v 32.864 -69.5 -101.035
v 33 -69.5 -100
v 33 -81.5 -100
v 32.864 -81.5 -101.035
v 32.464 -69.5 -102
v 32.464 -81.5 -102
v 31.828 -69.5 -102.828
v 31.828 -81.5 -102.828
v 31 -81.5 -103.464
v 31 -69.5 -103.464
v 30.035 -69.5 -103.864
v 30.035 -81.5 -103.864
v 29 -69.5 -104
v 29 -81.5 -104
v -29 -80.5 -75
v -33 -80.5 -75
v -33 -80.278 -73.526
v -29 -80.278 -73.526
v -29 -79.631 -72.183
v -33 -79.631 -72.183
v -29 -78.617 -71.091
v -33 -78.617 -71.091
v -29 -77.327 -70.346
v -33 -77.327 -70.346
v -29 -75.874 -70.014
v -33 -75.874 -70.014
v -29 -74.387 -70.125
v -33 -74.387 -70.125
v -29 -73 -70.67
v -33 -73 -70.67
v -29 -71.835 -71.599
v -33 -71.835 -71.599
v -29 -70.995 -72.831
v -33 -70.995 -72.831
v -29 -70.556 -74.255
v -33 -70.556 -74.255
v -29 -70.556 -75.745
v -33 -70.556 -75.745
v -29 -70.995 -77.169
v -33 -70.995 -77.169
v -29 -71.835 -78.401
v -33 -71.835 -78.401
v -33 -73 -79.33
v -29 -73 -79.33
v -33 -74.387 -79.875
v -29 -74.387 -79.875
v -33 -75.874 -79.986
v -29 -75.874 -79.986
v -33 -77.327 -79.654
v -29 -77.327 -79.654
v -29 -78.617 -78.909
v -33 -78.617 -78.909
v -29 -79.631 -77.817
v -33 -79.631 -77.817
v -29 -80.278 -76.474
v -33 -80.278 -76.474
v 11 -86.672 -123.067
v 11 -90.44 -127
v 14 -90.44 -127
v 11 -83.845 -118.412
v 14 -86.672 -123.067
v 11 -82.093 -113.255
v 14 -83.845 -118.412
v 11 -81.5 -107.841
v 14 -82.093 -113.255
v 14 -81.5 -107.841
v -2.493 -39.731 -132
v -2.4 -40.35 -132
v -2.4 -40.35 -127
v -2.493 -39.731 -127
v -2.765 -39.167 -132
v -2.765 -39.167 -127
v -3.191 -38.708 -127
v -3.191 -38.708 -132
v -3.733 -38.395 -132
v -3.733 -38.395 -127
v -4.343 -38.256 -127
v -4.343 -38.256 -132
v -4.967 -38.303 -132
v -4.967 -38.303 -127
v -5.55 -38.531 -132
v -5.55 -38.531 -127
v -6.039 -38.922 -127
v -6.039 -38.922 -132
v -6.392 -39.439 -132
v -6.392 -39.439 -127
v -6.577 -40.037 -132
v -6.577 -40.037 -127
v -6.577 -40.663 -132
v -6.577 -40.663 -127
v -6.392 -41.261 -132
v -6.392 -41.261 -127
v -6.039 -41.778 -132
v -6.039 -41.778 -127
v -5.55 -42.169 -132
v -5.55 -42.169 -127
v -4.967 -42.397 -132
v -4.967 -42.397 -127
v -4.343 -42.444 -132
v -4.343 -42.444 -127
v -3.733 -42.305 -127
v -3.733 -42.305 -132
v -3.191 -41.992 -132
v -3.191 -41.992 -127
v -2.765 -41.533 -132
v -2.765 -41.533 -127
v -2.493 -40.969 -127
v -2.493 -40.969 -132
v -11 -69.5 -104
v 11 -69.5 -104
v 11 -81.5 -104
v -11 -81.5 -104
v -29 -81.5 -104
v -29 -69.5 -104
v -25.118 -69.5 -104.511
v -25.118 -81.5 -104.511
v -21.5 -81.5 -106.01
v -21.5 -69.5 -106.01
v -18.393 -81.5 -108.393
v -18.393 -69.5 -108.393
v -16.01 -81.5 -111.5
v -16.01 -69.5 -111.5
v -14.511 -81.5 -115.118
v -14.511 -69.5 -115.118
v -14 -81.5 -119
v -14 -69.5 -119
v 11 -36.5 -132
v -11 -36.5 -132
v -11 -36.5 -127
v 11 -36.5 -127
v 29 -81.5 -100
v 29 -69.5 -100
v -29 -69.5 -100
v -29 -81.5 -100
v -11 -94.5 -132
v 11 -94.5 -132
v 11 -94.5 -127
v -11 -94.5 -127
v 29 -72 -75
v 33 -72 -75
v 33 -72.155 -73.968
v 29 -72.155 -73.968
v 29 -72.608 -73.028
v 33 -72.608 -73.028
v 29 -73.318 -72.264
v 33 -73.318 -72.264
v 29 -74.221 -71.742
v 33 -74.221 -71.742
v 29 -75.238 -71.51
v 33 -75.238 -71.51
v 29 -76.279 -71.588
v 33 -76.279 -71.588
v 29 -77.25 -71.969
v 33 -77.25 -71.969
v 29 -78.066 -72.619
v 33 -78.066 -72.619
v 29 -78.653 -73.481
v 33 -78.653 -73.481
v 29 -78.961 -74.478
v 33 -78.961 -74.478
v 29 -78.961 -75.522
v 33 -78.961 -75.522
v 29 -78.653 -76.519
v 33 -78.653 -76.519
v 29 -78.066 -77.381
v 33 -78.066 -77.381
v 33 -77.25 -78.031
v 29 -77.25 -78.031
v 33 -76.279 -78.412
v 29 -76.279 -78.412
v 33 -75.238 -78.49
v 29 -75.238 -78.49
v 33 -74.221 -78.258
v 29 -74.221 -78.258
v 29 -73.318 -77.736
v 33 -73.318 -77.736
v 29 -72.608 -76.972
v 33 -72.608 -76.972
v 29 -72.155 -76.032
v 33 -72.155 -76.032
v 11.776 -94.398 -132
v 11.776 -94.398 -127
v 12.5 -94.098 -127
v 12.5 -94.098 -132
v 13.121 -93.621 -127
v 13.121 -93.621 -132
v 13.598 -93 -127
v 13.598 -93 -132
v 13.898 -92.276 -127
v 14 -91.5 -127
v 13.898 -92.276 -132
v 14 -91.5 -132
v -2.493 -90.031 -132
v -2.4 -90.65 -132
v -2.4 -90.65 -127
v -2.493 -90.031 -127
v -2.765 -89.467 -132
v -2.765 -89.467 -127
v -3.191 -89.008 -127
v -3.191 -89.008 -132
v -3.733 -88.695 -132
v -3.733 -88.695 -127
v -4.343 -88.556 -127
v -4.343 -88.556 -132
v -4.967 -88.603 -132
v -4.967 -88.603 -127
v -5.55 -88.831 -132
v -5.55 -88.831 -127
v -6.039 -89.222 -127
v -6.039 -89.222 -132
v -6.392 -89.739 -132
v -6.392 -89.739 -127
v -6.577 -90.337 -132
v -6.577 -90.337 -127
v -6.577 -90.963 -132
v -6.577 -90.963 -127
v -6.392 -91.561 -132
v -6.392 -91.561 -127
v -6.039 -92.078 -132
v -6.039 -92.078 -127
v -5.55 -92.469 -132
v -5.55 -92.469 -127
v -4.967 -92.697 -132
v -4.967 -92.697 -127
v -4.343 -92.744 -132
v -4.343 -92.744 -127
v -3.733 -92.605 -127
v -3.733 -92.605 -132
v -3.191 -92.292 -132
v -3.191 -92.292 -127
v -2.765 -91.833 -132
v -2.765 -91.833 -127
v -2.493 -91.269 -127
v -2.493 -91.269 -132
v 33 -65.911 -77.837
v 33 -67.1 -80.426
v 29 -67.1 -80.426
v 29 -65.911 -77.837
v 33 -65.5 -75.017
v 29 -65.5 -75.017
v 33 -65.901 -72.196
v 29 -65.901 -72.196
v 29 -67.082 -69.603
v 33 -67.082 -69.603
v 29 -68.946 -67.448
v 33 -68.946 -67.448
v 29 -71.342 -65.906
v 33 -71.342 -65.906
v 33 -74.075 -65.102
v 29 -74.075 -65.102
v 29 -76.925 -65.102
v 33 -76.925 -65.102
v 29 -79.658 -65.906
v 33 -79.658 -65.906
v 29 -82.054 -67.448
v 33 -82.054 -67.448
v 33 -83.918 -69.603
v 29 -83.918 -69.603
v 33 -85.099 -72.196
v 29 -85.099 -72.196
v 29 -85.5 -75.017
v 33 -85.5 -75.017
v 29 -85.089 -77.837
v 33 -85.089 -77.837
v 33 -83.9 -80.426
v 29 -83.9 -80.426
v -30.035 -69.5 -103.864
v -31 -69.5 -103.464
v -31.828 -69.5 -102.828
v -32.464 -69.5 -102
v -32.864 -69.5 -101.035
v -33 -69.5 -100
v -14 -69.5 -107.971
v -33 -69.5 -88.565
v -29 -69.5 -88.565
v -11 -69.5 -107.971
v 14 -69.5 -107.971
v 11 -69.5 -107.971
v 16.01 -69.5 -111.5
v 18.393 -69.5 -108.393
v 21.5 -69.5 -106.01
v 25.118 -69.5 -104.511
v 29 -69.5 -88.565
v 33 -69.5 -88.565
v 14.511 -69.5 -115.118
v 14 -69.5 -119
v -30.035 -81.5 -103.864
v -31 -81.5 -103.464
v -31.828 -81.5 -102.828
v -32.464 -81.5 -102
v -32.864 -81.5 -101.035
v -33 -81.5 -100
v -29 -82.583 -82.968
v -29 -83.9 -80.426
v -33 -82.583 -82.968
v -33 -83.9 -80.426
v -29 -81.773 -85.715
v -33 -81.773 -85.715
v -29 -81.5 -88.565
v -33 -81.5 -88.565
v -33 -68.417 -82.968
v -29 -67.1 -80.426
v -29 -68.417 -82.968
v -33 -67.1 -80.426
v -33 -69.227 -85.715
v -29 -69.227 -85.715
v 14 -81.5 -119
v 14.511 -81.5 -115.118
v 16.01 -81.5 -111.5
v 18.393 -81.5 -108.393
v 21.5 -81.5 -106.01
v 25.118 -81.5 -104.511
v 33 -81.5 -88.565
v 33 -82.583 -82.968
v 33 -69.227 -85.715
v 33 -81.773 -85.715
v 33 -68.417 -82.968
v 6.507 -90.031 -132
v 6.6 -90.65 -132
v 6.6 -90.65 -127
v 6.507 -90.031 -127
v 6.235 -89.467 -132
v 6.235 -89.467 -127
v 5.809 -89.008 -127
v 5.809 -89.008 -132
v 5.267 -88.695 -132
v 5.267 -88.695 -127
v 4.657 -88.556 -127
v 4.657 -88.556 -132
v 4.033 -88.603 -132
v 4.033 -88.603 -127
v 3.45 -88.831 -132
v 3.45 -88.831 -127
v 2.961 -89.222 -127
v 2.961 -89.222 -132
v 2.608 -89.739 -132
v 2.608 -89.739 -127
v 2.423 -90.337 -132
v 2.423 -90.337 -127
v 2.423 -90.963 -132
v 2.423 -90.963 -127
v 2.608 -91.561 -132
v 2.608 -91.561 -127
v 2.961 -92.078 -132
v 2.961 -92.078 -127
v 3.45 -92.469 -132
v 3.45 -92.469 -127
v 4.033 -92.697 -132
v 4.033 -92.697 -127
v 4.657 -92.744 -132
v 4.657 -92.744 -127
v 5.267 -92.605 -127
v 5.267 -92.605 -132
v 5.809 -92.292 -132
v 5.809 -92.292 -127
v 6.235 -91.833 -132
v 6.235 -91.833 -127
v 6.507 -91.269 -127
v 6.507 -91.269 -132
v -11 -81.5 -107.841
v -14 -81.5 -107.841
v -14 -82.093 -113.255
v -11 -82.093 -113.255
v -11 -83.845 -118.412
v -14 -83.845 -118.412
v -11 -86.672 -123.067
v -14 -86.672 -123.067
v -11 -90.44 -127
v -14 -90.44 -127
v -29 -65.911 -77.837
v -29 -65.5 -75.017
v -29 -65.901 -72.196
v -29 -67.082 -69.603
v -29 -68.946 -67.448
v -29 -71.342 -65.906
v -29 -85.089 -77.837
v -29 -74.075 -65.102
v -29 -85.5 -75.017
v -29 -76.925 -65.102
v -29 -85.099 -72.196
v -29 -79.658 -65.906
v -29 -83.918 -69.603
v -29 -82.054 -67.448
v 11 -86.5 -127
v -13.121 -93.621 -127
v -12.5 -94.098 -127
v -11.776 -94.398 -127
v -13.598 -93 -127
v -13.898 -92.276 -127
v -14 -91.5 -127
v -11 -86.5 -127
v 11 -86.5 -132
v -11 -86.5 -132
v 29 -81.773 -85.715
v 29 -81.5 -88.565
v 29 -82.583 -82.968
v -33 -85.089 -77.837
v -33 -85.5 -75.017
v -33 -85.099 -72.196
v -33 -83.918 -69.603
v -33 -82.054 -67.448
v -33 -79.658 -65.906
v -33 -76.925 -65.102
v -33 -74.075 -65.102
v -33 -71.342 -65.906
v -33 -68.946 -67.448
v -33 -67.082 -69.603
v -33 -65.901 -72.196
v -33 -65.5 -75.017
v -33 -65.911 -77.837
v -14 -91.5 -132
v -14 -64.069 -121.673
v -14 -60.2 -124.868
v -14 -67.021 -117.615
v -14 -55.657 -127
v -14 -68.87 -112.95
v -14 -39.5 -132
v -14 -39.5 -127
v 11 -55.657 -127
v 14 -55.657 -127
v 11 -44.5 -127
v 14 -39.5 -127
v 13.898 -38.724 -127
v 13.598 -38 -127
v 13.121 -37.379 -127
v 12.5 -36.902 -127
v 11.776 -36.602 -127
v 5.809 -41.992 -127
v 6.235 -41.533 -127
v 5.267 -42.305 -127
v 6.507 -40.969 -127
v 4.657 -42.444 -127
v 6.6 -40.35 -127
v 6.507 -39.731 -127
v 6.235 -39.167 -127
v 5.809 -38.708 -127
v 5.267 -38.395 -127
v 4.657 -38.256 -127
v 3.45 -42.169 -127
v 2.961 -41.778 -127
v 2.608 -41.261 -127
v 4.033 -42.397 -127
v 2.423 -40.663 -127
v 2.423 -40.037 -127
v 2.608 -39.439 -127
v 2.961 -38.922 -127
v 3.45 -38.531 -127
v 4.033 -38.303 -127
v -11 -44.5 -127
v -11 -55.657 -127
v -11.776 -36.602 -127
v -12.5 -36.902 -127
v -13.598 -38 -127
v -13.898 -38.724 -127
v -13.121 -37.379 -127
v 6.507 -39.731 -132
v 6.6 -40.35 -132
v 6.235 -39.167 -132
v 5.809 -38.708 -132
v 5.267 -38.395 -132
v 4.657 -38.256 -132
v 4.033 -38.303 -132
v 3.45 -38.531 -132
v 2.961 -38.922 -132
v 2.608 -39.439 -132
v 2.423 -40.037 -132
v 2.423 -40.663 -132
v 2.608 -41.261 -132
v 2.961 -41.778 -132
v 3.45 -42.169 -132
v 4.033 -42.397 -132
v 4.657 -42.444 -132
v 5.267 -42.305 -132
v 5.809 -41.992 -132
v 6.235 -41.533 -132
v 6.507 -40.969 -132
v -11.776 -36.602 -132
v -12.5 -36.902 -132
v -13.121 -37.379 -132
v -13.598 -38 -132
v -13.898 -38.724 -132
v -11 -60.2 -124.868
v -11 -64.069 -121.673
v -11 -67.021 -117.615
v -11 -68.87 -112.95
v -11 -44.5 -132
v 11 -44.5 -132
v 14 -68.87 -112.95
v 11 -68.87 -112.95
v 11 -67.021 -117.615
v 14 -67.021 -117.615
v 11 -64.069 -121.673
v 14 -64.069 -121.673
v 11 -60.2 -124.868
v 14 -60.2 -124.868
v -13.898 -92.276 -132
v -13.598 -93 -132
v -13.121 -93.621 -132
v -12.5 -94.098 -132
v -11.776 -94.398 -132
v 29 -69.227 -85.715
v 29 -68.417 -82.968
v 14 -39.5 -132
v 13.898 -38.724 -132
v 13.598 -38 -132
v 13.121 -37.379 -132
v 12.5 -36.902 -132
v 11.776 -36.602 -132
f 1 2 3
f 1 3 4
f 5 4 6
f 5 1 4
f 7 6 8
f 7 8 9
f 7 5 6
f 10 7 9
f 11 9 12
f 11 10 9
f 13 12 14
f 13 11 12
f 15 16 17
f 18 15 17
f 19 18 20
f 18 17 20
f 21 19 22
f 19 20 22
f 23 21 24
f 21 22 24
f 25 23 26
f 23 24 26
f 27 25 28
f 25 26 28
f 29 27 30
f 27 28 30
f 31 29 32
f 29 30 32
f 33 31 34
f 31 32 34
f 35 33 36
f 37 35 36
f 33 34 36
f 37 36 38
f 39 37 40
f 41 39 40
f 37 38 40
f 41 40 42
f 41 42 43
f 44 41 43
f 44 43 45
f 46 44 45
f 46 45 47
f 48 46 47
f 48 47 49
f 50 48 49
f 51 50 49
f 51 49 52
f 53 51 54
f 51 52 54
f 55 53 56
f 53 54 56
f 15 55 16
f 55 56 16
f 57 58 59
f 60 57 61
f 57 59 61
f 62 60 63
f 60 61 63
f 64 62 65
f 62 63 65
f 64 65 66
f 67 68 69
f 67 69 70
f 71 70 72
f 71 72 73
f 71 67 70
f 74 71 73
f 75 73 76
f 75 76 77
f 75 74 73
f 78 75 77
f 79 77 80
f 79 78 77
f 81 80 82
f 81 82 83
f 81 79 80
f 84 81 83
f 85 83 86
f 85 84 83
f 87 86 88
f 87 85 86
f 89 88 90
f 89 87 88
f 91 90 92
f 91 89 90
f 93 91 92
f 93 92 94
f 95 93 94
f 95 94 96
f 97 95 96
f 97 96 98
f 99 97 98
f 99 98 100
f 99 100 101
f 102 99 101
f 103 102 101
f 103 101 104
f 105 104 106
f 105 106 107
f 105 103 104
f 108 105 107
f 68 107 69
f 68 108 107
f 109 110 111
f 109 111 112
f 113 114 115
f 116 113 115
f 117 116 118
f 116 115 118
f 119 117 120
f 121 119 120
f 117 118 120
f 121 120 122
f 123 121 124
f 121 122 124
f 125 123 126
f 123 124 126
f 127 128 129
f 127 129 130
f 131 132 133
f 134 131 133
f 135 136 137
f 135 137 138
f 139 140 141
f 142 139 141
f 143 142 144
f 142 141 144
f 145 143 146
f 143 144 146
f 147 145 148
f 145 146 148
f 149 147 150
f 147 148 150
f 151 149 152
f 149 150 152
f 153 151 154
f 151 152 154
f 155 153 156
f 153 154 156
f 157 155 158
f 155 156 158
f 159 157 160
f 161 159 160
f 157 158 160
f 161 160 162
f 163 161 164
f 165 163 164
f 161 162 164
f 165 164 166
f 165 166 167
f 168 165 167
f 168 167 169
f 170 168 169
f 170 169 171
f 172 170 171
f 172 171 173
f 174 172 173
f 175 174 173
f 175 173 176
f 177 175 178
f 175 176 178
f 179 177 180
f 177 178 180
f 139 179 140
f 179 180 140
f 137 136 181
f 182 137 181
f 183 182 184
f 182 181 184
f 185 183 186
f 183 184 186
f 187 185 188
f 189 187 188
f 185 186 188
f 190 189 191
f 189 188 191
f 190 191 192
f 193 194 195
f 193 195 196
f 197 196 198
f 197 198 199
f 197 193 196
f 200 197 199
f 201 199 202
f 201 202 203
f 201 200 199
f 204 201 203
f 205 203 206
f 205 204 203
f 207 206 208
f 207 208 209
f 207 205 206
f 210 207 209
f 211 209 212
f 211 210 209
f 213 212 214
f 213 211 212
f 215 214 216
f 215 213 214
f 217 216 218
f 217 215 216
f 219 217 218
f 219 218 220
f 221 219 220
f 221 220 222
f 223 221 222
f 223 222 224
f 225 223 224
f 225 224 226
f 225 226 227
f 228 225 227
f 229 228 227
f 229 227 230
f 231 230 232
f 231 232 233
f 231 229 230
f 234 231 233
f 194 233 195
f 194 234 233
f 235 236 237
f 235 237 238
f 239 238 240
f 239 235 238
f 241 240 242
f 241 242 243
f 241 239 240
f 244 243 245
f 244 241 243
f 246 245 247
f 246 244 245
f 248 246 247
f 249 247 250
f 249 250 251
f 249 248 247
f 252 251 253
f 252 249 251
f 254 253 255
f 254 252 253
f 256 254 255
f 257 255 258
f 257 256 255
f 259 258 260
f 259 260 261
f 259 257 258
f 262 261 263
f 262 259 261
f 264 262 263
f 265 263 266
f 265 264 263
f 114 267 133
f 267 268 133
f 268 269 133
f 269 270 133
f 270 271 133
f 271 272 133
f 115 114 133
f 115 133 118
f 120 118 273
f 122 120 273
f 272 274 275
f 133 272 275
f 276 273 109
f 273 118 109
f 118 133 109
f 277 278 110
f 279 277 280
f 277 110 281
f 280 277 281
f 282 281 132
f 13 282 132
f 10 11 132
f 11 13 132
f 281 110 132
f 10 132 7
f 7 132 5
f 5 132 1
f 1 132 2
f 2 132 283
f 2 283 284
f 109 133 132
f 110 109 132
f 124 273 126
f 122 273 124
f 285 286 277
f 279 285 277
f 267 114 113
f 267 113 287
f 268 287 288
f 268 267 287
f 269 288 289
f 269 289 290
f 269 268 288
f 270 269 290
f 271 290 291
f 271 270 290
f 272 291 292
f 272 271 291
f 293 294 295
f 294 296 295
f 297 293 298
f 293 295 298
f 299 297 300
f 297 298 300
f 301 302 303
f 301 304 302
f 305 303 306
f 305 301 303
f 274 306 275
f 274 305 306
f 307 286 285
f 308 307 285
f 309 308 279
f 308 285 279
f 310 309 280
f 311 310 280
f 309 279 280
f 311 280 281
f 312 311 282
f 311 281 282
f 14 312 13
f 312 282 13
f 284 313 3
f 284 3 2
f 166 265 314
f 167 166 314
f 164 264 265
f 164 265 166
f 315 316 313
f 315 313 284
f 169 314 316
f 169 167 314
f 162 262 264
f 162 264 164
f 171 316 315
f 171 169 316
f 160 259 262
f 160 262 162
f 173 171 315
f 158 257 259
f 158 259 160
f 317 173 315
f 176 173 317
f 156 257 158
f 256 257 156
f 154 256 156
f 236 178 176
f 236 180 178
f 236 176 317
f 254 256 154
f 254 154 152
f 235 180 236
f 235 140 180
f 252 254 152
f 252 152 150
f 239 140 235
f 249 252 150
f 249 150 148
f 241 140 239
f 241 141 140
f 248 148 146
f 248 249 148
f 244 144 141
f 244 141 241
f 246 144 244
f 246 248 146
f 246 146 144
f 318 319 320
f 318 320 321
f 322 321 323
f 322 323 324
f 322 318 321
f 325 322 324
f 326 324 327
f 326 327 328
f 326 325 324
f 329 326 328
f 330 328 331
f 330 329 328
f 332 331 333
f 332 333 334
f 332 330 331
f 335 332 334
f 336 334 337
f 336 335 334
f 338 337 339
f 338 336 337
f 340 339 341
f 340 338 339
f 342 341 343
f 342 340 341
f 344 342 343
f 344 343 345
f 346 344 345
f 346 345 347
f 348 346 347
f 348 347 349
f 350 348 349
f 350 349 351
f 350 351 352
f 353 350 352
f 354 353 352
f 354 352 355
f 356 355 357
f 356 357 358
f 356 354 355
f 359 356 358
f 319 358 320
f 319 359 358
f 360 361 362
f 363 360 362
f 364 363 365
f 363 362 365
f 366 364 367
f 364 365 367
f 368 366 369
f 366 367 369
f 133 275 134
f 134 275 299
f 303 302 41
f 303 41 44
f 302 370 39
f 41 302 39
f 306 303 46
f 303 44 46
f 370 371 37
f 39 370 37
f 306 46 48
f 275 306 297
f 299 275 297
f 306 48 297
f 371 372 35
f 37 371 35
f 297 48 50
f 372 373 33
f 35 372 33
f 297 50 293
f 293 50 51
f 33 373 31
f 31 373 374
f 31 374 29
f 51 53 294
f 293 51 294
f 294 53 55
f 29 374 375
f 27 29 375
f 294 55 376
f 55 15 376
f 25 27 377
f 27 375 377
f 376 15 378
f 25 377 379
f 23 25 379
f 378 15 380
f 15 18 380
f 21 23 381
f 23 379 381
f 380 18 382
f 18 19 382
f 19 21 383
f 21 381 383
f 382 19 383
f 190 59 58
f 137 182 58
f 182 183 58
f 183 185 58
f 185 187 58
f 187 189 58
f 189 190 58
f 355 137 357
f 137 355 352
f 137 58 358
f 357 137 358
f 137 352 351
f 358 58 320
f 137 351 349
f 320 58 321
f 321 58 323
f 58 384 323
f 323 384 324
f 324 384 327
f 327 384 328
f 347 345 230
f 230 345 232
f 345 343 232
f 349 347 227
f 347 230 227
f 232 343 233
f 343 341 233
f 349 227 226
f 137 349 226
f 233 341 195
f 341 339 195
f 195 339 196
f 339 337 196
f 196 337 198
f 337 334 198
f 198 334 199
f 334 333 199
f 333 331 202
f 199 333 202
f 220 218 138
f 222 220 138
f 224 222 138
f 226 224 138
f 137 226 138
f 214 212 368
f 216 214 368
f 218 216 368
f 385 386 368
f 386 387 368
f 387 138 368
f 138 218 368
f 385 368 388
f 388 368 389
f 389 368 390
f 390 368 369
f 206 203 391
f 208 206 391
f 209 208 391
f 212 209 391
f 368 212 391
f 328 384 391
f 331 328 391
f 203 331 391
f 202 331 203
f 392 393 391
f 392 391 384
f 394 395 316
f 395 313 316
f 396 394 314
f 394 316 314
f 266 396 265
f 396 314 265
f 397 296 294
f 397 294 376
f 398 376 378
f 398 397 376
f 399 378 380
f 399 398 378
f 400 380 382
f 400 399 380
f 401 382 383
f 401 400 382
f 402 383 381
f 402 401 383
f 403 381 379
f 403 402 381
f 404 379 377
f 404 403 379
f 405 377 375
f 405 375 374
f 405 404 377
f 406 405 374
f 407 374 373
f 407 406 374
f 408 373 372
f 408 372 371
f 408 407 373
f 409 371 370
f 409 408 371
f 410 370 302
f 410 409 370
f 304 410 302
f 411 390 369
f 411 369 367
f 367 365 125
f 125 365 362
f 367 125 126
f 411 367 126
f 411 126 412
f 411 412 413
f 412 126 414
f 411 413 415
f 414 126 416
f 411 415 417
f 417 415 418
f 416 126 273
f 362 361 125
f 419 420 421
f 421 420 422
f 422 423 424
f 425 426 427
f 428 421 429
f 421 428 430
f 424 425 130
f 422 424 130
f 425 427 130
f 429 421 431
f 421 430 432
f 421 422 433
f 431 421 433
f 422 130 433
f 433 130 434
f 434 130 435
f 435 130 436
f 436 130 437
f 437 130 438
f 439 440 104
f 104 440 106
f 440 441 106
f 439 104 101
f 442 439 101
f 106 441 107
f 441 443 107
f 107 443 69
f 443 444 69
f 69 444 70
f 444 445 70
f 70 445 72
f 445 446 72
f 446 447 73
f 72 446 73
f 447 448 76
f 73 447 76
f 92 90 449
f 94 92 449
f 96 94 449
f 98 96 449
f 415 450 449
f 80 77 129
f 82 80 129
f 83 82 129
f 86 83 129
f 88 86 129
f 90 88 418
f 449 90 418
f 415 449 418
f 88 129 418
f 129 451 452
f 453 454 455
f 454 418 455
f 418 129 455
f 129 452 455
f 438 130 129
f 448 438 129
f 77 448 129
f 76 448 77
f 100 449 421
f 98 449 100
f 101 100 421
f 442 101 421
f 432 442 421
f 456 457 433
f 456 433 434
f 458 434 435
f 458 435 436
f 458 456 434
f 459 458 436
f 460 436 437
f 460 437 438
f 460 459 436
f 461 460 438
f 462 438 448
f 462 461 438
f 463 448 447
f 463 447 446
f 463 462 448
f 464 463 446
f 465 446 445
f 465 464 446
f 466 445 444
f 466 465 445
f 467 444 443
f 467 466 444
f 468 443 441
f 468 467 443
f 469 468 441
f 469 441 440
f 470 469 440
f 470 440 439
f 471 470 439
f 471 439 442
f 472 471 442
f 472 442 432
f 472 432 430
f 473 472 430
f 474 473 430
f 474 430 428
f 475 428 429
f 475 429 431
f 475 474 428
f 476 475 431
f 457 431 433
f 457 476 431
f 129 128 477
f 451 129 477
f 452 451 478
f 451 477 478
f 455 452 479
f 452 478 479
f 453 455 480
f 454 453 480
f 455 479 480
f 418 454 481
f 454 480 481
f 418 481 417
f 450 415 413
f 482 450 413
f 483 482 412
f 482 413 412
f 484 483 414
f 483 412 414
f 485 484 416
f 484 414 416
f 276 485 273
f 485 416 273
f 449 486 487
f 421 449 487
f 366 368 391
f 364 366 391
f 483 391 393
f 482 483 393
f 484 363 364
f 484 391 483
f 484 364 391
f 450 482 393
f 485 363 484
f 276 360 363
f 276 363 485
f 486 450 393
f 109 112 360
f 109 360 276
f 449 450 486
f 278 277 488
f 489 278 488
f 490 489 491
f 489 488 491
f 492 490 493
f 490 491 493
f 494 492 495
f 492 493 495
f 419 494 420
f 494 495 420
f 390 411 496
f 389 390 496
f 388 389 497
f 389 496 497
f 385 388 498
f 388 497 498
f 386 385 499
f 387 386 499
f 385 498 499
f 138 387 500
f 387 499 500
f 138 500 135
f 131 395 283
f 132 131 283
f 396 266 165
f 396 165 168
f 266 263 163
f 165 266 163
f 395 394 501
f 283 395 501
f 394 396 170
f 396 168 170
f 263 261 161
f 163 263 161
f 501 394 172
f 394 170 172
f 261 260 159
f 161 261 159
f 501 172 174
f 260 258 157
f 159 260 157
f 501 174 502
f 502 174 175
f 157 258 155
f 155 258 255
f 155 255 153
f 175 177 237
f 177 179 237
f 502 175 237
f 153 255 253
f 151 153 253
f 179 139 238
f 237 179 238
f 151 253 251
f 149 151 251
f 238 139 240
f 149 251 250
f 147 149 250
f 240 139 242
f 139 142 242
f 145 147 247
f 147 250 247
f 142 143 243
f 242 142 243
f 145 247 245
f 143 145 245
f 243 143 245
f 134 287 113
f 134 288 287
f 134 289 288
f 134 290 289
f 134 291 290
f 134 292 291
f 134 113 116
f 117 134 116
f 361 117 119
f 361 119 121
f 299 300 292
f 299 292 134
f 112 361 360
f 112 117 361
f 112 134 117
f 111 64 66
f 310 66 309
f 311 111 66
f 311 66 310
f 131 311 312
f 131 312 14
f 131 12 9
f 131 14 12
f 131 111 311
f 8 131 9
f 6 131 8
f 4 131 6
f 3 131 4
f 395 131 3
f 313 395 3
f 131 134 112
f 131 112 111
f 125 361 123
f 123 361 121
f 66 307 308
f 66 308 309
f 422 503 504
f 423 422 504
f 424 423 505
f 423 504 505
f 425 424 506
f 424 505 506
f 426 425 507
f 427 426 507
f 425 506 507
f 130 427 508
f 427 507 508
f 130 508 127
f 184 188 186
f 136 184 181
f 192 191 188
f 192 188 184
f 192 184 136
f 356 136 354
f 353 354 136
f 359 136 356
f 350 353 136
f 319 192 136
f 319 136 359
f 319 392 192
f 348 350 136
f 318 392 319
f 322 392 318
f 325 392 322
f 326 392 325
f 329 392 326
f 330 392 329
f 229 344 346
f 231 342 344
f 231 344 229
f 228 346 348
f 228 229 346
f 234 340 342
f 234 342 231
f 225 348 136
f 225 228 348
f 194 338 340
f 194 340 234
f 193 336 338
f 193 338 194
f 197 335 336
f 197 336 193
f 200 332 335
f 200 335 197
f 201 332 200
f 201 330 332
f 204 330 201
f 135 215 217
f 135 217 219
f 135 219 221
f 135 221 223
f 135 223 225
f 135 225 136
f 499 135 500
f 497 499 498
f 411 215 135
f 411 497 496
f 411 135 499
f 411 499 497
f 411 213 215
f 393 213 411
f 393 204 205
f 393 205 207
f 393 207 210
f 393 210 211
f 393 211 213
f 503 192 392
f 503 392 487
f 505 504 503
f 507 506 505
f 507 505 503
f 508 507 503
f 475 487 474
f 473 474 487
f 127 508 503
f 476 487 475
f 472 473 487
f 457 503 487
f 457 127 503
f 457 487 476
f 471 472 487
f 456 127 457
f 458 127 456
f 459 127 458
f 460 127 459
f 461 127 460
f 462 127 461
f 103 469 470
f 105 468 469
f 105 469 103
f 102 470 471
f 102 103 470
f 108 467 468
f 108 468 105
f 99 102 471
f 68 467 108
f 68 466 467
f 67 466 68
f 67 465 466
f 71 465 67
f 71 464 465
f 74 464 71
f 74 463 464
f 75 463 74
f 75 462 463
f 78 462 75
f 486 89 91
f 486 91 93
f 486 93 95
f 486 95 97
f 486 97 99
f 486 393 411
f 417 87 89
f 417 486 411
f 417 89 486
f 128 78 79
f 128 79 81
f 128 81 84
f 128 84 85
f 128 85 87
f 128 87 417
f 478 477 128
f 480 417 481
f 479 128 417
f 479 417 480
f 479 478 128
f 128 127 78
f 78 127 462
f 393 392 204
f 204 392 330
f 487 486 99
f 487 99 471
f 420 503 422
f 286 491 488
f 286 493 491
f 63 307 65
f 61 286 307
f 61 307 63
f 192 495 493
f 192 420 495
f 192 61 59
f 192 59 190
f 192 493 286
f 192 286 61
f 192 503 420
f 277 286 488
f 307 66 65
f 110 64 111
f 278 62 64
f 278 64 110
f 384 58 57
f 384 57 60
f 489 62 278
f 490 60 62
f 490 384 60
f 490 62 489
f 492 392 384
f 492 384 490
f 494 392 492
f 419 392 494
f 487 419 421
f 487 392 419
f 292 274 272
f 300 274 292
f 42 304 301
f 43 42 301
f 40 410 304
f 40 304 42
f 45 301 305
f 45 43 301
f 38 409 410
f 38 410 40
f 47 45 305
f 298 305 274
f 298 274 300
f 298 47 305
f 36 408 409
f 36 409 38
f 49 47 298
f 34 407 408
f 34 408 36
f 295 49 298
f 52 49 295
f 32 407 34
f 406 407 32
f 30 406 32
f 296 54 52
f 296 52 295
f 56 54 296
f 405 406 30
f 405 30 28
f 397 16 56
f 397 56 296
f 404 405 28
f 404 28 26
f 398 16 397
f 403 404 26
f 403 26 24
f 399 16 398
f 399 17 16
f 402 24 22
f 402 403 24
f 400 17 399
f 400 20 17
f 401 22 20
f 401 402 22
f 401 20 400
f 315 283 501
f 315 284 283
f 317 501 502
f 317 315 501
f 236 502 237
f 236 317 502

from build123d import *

# Parameters (mm, degrees)
SKETCH022_R             = 2.1
SKETCH022_W             = 22
SKETCH022_H             = 42
PAD010_DEPTH            = 5
PAD013_DEPTH            = 3
PAD011_DEPTH            = 3
PAD012_DEPTH            = 12
SKETCH028_R             = 10
PAD014_DEPTH            = 4
SKETCH029_R             = 3.5
POCKET011_DEPTH         = 4
SKETCH026_R             = 10
PAD015_DEPTH            = 4
SKETCH025_R             = 5
POCKET012_DEPTH         = 4
FILLET002_R             = 15
BODY005_PLACEMENT_ANGLE = 90


with BuildPart() as part:
    # Sketch022 → Pad010 (new body)
    with BuildSketch(Plane.XZ):
        with BuildLine():
            Line((-11, 29), (11, 29))
            ThreePointArc((14, 26), (13.1213203436, 28.1213203436), (11, 29))
            Line((14, 26), (14, -26))
            ThreePointArc((11, -29), (13.1213203436, -28.1213203436), (14, -26))
            Line((11, -29), (-11, -29))
            ThreePointArc((-14, -26), (-13.1213203436, -28.1213203436), (-11, -29))
            Line((-14, -26), (-14, 26))
            ThreePointArc((-11, 29), (-13.1213203436, 28.1213203436), (-14, 26))
        make_face()
        with Locations((-4.5, -25.15)):
            Circle(SKETCH022_R, mode=Mode.SUBTRACT)
        with Locations((4.5, -25.15)):
            Circle(SKETCH022_R, mode=Mode.SUBTRACT)
        with Locations((-4.5, 25.15)):
            Circle(SKETCH022_R, mode=Mode.SUBTRACT)
        with Locations((4.5, 25.15)):
            Circle(SKETCH022_R, mode=Mode.SUBTRACT)
        Rectangle(SKETCH022_W, SKETCH022_H, mode=Mode.SUBTRACT)
    extrude(amount=PAD010_DEPTH)

    # Sketch023 (on Face1 of Pad010) → Pad013 (join)
    with BuildSketch(Plane(origin=(-14, 0, 0), x_dir=(0, 0, -1), z_dir=(-1, 0, 0))):
        with BuildLine():
            Line((4, 29.0287840283), (16, 29.0287840283))
            Line((16, 29.0287840283), (16, 24.1593727123))
            ThreePointArc((16, 24.1593727123), (18.3615371547, 13.5527709945), (25, 4.95))
            Line((-10, 4.95), (25, 4.95))
            ThreePointArc((-10, 4.95), (0.1245154966, 12.1966244621), (4, 24.0287840283))
            Line((4, 24.0287840283), (4, 29.0287840283))
        make_face()
    extrude(amount=-PAD013_DEPTH)

    # Sketch027 (on Face9 of Pad013) → Pad011 (join)
    with BuildSketch(Plane(origin=(14, 0, 0), x_dir=(0, 0, 1), z_dir=(1, 0, 0))):
        with BuildLine():
            Line((10, 4.95), (-25, 4.95))
            ThreePointArc((-25, 4.95), (-18.3615371547, 13.5527709945), (-16, 24.1593727123))
            Line((-16, 24.1593727123), (-16, 29.0287840283))
            Line((-16, 29.0287840283), (-4, 29.0287840283))
            Line((-4, 29.0287840283), (-4, 24.0287840283))
            ThreePointArc((-4, 24.0287840283), (-0.1245154966, 12.1966244621), (10, 4.95))
        make_face()
    extrude(amount=-PAD011_DEPTH)

    # Sketch024 (on Face31 of Pad011) → Pad012 (join)
    with BuildSketch(Plane(origin=(0, 0, -4), x_dir=(-1, 0, 0), z_dir=(0, 0, 1))):
        with BuildLine():
            Line((-29, 32), (29, 32))
            Line((29, 57), (29, 32))
            Line((33, 57), (29, 57))
            Line((33, 32), (33, 57))
            ThreePointArc((29, 28), (31.8284271247, 29.1715728753), (33, 32))
            ThreePointArc((29, 28), (18.3933982822, 23.6066017178), (14, 13))
            Line((14, 28), (14, 13))
            Line((-14, 28), (14, 28))
            Line((-14, 28), (-14, 13))
            ThreePointArc((-14, 13), (-18.3933982822, 23.6066017178), (-29, 28))
            ThreePointArc((-33, 32), (-31.8284271247, 29.1715728753), (-29, 28))
            Line((-33, 32), (-33, 57))
            Line((-33, 57), (-29, 57))
            Line((-29, 57), (-29, 32))
        make_face()
    extrude(amount=-PAD012_DEPTH)

    # Sketch028 (on Face53 of Pad012) → Pad014 (join)
    with BuildSketch(Plane(origin=(33, 0, 0), x_dir=(0, 0, 1), z_dir=(1, 0, 0))):
        with Locations((-10, 57)):
            Circle(SKETCH028_R)
    extrude(amount=-PAD014_DEPTH)

    # Sketch029 (on Face56 of Pad014) → Pocket011 (cut)
    with BuildSketch(Plane(origin=(33, 0, 0), x_dir=(0, 0, 1), z_dir=(1, 0, 0))):
        with Locations((-10, 57)):
            Circle(SKETCH029_R)
    extrude(amount=-POCKET011_DEPTH, mode=Mode.SUBTRACT)

    # Sketch026 (on Face47 of Pocket011) → Pad015 (join)
    with BuildSketch(Plane(origin=(-33, 0, 0), x_dir=(0, 0, -1), z_dir=(-1, 0, 0))):
        with Locations((10, 57)):
            Circle(SKETCH026_R)
    extrude(amount=-PAD015_DEPTH)

    # Sketch025 (on Face58 of Pad015) → Pocket012 (cut)
    with BuildSketch(Plane(origin=(-33, 0, 0), x_dir=(0, 0, -1), z_dir=(-1, 0, 0))):
        with Locations((10, 57)):
            Circle(SKETCH025_R)
    extrude(amount=-POCKET012_DEPTH, mode=Mode.SUBTRACT)

    # Fillet002
    fillet002_edges = [part.edges().sort_by_distance(p)[0] for p in [
        (-31, -49, -4),
        (31, -49, -16),
        (-31, -49, -16),
        (31, -49, -4),
    ]]
    fillet(fillet002_edges, radius=FILLET002_R)


with BuildPart() as part_1:
    # Body005 placement: moved
    add(part.part.moved(Location((0, -65.5, -132))).rotate(Axis((0, -65.5, -132), (-1, 0, 0)), BODY005_PLACEMENT_ANGLE))


solid = part_1.part
